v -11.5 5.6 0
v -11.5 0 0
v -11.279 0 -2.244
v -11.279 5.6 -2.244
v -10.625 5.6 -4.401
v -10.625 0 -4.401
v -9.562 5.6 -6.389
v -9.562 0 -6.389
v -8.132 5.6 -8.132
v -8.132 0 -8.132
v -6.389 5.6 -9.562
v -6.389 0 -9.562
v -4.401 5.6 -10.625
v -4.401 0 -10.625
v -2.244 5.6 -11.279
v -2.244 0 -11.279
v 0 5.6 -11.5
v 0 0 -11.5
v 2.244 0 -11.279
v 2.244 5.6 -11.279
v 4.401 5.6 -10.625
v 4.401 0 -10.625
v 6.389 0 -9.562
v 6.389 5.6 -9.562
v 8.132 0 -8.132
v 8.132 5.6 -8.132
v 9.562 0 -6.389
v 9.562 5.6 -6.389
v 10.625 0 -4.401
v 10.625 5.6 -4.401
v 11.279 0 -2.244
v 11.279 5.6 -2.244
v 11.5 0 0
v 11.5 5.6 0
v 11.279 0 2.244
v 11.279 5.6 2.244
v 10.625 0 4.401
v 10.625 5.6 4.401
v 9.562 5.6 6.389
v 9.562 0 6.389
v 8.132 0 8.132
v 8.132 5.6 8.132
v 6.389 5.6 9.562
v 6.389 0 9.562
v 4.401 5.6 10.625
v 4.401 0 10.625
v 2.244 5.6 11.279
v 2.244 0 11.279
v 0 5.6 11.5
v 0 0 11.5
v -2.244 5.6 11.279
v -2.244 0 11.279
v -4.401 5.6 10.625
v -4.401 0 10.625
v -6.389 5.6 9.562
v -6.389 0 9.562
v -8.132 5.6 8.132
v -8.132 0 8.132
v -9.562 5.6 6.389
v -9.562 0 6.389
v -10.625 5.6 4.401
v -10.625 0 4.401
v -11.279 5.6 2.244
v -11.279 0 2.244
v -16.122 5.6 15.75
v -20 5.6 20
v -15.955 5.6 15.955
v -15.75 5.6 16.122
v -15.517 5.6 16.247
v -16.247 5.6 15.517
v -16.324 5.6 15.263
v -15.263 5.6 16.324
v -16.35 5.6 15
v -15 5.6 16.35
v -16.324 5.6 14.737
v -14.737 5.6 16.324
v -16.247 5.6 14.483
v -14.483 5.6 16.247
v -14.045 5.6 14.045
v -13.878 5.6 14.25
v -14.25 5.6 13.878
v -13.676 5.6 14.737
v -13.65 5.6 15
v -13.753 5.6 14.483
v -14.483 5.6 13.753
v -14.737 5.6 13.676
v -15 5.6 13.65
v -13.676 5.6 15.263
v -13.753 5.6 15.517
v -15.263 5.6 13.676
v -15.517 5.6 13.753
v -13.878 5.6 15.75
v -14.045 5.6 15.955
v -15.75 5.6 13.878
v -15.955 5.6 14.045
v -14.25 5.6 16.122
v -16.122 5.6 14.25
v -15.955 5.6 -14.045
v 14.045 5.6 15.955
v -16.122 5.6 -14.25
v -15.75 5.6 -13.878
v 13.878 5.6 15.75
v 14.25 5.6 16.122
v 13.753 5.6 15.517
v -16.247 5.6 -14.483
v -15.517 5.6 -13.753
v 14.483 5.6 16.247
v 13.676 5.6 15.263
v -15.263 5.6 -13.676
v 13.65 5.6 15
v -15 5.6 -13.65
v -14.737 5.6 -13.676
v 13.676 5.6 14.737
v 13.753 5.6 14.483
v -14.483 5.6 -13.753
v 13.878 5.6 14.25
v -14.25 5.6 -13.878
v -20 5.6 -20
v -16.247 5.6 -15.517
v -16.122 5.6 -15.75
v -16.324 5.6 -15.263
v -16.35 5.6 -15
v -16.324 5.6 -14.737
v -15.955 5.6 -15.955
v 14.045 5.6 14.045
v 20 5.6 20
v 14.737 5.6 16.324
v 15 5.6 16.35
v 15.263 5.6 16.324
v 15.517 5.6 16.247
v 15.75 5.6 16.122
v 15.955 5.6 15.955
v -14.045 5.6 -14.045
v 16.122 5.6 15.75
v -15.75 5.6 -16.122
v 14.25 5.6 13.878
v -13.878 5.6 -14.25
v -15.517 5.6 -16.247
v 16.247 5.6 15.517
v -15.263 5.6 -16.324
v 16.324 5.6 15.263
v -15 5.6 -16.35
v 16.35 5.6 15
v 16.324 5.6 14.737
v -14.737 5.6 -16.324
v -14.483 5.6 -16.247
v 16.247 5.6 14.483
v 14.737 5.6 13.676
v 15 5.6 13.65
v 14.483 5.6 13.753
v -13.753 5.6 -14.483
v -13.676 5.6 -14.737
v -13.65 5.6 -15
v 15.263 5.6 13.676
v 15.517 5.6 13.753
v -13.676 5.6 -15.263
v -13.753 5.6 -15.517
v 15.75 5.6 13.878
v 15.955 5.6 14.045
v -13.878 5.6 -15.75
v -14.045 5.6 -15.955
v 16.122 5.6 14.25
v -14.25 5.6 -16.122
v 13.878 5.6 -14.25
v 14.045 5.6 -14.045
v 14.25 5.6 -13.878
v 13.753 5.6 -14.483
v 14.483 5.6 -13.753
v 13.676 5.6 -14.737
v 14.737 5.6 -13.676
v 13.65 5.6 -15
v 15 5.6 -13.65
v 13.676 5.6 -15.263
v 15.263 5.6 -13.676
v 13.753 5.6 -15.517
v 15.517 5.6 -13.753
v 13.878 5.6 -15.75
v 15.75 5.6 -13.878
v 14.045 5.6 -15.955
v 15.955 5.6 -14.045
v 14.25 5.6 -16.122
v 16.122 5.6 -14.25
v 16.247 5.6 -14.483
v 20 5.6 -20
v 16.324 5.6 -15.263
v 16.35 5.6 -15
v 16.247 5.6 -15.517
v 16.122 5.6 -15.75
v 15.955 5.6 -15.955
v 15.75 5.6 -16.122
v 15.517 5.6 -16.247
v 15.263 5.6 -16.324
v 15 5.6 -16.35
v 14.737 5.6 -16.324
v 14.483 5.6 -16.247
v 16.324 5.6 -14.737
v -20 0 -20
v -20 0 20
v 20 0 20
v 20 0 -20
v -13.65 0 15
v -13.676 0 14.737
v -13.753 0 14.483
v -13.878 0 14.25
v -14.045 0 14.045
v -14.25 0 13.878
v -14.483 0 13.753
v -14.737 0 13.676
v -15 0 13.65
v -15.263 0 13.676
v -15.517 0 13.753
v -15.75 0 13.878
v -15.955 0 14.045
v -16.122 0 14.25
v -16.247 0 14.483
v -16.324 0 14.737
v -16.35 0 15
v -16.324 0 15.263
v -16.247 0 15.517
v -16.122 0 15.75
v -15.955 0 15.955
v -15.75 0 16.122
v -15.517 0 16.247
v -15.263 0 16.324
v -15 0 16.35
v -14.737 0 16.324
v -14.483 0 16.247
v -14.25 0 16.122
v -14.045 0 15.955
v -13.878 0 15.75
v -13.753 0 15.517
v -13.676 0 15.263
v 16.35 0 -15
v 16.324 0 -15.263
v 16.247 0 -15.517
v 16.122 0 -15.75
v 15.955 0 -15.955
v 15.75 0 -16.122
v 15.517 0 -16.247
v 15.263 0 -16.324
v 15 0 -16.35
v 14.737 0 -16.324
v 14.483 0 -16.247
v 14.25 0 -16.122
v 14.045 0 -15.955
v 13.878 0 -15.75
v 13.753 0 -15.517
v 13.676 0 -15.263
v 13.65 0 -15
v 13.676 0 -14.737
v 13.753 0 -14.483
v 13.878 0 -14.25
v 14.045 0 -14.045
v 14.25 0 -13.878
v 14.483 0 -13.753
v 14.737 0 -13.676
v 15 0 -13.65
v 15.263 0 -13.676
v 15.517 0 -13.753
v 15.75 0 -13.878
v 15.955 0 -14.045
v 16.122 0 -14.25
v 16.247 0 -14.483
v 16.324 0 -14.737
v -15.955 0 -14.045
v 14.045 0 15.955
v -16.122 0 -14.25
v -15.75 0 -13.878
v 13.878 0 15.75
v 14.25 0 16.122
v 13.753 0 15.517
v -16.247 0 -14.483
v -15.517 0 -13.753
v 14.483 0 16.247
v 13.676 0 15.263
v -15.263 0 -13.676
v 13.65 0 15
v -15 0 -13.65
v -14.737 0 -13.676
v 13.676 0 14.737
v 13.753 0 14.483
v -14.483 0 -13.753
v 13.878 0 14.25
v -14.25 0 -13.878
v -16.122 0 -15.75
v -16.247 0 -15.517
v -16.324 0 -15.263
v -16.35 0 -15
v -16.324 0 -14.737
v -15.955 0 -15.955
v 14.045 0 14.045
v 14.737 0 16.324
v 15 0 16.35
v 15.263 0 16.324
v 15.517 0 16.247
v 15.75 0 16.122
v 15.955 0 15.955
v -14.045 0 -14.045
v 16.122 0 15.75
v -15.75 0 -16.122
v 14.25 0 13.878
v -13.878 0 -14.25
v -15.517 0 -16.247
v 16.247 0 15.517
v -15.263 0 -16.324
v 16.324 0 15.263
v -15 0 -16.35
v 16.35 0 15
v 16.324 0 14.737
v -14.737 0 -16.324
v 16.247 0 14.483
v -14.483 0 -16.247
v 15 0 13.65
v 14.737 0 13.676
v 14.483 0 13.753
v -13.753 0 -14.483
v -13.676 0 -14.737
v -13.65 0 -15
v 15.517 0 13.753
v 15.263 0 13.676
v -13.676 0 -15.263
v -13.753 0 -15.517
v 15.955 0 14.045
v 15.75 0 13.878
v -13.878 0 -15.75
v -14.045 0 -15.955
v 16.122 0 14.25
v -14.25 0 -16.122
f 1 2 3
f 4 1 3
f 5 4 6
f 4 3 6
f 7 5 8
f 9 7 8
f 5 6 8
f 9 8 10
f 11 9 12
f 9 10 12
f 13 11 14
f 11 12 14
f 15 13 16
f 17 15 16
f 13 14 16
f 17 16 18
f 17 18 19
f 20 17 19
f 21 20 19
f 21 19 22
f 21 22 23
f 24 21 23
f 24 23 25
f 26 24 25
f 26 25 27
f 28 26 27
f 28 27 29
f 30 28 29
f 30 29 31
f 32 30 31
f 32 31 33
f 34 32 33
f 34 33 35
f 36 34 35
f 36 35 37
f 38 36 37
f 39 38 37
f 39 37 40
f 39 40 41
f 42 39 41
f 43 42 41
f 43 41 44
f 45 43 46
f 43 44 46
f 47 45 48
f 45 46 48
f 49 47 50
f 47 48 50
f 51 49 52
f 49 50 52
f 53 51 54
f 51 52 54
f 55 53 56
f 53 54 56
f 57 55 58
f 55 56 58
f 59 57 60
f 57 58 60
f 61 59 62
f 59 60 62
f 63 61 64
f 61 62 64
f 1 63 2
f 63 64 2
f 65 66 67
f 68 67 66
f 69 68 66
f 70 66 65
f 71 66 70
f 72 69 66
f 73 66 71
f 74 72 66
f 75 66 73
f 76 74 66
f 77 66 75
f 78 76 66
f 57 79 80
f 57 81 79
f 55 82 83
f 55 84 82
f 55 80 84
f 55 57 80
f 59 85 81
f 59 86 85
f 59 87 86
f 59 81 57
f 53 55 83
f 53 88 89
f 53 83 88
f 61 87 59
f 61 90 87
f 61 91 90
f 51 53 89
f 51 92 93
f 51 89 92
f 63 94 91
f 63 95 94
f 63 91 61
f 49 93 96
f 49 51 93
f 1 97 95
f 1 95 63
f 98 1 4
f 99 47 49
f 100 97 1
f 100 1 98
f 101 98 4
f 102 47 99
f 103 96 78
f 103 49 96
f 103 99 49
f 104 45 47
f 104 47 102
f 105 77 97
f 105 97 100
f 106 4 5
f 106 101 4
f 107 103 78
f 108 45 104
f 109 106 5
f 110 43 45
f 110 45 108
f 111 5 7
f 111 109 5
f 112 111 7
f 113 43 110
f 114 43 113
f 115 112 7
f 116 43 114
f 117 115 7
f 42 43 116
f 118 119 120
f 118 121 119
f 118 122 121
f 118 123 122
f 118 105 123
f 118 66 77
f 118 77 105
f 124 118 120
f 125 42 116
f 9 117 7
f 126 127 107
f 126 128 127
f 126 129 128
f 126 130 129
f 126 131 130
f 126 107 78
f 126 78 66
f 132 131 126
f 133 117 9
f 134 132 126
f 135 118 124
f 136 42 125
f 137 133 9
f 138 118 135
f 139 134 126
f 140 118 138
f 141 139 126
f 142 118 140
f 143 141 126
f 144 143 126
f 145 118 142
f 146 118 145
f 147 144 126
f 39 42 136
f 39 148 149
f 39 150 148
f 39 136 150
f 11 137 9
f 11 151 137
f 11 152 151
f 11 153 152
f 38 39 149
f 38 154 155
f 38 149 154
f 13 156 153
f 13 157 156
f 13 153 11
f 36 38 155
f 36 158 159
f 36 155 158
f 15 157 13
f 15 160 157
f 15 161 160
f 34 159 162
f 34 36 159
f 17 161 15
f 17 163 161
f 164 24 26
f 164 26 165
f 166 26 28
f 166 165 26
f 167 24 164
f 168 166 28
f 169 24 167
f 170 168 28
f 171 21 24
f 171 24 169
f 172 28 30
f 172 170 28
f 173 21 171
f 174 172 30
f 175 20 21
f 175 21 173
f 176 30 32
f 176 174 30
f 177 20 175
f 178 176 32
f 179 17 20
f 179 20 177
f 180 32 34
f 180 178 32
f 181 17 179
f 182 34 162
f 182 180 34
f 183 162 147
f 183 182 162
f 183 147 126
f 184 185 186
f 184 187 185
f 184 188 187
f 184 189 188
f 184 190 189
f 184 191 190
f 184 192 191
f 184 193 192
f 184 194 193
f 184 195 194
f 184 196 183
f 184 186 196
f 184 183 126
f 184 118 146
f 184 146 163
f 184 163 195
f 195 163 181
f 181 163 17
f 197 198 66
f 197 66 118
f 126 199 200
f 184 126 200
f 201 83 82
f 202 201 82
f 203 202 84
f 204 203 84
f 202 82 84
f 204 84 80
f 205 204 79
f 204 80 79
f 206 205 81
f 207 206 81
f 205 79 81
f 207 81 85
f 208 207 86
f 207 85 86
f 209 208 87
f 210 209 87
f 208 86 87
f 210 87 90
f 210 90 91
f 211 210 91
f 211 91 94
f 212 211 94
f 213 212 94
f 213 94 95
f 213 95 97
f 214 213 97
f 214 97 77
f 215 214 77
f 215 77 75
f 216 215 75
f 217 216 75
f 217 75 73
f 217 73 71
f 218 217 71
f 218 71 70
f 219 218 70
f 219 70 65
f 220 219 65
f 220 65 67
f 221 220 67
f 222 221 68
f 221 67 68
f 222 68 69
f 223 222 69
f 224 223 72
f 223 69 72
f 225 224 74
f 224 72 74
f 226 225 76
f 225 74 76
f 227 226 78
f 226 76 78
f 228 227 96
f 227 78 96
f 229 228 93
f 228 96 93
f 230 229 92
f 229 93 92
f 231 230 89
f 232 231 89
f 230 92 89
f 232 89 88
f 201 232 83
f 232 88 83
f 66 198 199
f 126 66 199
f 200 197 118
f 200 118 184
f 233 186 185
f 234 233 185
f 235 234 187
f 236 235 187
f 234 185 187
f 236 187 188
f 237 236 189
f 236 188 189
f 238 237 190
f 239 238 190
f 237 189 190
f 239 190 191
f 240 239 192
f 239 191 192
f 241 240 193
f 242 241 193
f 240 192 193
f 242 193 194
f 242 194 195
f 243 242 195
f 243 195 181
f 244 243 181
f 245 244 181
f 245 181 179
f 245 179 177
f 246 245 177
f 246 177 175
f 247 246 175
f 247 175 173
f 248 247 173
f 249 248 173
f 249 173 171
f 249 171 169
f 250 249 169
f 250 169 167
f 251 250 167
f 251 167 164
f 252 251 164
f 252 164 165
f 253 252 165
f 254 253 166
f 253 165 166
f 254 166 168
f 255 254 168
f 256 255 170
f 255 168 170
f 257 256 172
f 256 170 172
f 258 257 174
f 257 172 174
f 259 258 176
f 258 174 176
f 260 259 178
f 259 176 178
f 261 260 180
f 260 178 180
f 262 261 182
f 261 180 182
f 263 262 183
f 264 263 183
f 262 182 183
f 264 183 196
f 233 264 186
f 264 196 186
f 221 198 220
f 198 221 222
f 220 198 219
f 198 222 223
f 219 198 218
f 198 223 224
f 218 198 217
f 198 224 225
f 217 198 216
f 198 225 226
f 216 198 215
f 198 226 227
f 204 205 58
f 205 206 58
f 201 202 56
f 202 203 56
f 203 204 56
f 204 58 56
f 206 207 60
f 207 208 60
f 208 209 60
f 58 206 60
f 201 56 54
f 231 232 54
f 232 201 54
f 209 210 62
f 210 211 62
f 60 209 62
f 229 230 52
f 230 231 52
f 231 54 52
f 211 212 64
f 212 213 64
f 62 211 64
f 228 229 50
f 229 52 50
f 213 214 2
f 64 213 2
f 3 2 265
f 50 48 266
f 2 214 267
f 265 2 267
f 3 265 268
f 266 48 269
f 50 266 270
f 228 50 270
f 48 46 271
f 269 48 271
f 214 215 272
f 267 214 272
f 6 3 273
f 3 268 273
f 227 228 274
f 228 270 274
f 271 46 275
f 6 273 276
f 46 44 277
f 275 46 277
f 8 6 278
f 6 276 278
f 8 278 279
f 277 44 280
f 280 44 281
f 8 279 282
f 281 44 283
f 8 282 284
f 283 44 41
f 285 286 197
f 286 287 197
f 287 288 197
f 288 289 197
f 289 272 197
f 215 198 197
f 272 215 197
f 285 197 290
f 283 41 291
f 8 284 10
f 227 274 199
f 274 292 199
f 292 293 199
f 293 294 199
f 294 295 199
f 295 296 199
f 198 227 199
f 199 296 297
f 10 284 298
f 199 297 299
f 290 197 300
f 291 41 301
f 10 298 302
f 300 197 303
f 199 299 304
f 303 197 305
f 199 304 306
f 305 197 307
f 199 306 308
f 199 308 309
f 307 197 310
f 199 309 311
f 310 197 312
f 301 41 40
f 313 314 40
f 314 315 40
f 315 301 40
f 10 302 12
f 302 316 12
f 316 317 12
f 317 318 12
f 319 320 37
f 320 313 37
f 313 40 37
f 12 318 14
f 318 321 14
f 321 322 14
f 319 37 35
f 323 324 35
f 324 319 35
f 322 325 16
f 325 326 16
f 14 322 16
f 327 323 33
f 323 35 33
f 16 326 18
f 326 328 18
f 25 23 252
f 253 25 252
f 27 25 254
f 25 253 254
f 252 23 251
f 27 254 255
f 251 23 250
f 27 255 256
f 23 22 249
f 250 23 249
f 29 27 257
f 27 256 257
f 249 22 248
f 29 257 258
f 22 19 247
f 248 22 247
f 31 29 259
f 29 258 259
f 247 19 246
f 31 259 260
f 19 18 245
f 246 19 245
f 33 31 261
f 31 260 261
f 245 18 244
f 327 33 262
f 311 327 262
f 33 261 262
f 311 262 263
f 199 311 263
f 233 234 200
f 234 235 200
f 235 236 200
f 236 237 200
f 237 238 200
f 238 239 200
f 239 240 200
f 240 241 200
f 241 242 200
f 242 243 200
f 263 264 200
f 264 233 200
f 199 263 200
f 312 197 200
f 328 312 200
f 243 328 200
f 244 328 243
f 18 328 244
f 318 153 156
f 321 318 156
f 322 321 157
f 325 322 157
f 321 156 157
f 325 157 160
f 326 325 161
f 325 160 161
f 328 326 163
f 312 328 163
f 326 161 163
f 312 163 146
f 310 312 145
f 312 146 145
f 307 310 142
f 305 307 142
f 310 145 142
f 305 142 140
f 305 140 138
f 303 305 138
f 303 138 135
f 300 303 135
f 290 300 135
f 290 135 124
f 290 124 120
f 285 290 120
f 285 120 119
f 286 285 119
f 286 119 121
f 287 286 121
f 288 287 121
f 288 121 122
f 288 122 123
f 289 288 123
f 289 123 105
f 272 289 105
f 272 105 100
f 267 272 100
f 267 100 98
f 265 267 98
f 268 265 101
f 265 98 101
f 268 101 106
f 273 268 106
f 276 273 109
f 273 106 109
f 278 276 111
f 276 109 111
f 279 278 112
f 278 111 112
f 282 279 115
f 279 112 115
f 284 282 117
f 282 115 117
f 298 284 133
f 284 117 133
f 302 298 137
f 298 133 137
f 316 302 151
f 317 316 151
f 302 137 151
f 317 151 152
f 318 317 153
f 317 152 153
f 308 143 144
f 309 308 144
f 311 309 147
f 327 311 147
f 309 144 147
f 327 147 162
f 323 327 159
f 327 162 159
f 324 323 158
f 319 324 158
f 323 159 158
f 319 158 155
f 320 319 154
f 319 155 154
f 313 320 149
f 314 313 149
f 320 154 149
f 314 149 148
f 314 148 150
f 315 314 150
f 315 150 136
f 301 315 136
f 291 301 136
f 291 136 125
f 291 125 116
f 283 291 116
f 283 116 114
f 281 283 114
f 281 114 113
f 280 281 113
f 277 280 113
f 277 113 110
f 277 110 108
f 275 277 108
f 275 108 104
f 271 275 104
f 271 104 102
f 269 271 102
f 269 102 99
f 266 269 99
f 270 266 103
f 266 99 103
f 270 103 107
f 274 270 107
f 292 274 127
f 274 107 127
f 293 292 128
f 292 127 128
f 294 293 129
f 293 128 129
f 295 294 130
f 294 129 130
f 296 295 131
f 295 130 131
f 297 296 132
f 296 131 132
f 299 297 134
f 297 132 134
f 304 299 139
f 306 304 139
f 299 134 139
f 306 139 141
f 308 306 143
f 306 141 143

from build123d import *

# Parameters (mm, degrees)
SKETCH1_W           = 40
SKETCH1_H           = 40
BOSS_EXTRUDE1_DEPTH = 5.6
SKETCH2_R           = 11
CUT_EXTRUDE1_DEPTH  = 6.6
SKETCH3_R           = 11.5
CUT_EXTRUDE2_DEPTH  = 7.5
SKETCH5_R           = 1.35
CUT_EXTRUDE4_DEPTH  = 6.6


with BuildPart() as part:
    # Sketch1 → Boss-Extrude1 (new body)
    with BuildSketch(Plane(origin=(0, 0, 0), x_dir=(1, 0, 0), z_dir=(0, 1, 0))):
        Rectangle(SKETCH1_W, SKETCH1_H)
    extrude(amount=BOSS_EXTRUDE1_DEPTH)

    # Sketch2 → Cut-Extrude1 (cut, through all)
    with BuildSketch(Plane(origin=(0, 5.6, 0), x_dir=(1, 0, 0), z_dir=(0, 1, 0))):
        Circle(SKETCH2_R)
    extrude(amount=-CUT_EXTRUDE1_DEPTH, mode=Mode.SUBTRACT)

    # Sketch3 → Cut-Extrude2 (cut)
    with BuildSketch(Plane(origin=(0, 0, 0), x_dir=(-1, 0, 0), z_dir=(0, -1, 0))):
        Circle(SKETCH3_R)
    extrude(amount=-CUT_EXTRUDE2_DEPTH, mode=Mode.SUBTRACT)

    # Sketch5 → Cut-Extrude4 (cut, through all)
    with BuildSketch(Plane(origin=(0, 5.6, 0), x_dir=(1, 0, 0), z_dir=(0, 1, 0))):
        with Locations((-15, 15)):
            Circle(SKETCH5_R)
        with Locations((15, 15)):
            Circle(SKETCH5_R)
        with Locations((15, -15)):
            Circle(SKETCH5_R)
        with Locations((-15, -15)):
            Circle(SKETCH5_R)
    extrude(amount=-CUT_EXTRUDE4_DEPTH, mode=Mode.SUBTRACT)


solid = part.part
